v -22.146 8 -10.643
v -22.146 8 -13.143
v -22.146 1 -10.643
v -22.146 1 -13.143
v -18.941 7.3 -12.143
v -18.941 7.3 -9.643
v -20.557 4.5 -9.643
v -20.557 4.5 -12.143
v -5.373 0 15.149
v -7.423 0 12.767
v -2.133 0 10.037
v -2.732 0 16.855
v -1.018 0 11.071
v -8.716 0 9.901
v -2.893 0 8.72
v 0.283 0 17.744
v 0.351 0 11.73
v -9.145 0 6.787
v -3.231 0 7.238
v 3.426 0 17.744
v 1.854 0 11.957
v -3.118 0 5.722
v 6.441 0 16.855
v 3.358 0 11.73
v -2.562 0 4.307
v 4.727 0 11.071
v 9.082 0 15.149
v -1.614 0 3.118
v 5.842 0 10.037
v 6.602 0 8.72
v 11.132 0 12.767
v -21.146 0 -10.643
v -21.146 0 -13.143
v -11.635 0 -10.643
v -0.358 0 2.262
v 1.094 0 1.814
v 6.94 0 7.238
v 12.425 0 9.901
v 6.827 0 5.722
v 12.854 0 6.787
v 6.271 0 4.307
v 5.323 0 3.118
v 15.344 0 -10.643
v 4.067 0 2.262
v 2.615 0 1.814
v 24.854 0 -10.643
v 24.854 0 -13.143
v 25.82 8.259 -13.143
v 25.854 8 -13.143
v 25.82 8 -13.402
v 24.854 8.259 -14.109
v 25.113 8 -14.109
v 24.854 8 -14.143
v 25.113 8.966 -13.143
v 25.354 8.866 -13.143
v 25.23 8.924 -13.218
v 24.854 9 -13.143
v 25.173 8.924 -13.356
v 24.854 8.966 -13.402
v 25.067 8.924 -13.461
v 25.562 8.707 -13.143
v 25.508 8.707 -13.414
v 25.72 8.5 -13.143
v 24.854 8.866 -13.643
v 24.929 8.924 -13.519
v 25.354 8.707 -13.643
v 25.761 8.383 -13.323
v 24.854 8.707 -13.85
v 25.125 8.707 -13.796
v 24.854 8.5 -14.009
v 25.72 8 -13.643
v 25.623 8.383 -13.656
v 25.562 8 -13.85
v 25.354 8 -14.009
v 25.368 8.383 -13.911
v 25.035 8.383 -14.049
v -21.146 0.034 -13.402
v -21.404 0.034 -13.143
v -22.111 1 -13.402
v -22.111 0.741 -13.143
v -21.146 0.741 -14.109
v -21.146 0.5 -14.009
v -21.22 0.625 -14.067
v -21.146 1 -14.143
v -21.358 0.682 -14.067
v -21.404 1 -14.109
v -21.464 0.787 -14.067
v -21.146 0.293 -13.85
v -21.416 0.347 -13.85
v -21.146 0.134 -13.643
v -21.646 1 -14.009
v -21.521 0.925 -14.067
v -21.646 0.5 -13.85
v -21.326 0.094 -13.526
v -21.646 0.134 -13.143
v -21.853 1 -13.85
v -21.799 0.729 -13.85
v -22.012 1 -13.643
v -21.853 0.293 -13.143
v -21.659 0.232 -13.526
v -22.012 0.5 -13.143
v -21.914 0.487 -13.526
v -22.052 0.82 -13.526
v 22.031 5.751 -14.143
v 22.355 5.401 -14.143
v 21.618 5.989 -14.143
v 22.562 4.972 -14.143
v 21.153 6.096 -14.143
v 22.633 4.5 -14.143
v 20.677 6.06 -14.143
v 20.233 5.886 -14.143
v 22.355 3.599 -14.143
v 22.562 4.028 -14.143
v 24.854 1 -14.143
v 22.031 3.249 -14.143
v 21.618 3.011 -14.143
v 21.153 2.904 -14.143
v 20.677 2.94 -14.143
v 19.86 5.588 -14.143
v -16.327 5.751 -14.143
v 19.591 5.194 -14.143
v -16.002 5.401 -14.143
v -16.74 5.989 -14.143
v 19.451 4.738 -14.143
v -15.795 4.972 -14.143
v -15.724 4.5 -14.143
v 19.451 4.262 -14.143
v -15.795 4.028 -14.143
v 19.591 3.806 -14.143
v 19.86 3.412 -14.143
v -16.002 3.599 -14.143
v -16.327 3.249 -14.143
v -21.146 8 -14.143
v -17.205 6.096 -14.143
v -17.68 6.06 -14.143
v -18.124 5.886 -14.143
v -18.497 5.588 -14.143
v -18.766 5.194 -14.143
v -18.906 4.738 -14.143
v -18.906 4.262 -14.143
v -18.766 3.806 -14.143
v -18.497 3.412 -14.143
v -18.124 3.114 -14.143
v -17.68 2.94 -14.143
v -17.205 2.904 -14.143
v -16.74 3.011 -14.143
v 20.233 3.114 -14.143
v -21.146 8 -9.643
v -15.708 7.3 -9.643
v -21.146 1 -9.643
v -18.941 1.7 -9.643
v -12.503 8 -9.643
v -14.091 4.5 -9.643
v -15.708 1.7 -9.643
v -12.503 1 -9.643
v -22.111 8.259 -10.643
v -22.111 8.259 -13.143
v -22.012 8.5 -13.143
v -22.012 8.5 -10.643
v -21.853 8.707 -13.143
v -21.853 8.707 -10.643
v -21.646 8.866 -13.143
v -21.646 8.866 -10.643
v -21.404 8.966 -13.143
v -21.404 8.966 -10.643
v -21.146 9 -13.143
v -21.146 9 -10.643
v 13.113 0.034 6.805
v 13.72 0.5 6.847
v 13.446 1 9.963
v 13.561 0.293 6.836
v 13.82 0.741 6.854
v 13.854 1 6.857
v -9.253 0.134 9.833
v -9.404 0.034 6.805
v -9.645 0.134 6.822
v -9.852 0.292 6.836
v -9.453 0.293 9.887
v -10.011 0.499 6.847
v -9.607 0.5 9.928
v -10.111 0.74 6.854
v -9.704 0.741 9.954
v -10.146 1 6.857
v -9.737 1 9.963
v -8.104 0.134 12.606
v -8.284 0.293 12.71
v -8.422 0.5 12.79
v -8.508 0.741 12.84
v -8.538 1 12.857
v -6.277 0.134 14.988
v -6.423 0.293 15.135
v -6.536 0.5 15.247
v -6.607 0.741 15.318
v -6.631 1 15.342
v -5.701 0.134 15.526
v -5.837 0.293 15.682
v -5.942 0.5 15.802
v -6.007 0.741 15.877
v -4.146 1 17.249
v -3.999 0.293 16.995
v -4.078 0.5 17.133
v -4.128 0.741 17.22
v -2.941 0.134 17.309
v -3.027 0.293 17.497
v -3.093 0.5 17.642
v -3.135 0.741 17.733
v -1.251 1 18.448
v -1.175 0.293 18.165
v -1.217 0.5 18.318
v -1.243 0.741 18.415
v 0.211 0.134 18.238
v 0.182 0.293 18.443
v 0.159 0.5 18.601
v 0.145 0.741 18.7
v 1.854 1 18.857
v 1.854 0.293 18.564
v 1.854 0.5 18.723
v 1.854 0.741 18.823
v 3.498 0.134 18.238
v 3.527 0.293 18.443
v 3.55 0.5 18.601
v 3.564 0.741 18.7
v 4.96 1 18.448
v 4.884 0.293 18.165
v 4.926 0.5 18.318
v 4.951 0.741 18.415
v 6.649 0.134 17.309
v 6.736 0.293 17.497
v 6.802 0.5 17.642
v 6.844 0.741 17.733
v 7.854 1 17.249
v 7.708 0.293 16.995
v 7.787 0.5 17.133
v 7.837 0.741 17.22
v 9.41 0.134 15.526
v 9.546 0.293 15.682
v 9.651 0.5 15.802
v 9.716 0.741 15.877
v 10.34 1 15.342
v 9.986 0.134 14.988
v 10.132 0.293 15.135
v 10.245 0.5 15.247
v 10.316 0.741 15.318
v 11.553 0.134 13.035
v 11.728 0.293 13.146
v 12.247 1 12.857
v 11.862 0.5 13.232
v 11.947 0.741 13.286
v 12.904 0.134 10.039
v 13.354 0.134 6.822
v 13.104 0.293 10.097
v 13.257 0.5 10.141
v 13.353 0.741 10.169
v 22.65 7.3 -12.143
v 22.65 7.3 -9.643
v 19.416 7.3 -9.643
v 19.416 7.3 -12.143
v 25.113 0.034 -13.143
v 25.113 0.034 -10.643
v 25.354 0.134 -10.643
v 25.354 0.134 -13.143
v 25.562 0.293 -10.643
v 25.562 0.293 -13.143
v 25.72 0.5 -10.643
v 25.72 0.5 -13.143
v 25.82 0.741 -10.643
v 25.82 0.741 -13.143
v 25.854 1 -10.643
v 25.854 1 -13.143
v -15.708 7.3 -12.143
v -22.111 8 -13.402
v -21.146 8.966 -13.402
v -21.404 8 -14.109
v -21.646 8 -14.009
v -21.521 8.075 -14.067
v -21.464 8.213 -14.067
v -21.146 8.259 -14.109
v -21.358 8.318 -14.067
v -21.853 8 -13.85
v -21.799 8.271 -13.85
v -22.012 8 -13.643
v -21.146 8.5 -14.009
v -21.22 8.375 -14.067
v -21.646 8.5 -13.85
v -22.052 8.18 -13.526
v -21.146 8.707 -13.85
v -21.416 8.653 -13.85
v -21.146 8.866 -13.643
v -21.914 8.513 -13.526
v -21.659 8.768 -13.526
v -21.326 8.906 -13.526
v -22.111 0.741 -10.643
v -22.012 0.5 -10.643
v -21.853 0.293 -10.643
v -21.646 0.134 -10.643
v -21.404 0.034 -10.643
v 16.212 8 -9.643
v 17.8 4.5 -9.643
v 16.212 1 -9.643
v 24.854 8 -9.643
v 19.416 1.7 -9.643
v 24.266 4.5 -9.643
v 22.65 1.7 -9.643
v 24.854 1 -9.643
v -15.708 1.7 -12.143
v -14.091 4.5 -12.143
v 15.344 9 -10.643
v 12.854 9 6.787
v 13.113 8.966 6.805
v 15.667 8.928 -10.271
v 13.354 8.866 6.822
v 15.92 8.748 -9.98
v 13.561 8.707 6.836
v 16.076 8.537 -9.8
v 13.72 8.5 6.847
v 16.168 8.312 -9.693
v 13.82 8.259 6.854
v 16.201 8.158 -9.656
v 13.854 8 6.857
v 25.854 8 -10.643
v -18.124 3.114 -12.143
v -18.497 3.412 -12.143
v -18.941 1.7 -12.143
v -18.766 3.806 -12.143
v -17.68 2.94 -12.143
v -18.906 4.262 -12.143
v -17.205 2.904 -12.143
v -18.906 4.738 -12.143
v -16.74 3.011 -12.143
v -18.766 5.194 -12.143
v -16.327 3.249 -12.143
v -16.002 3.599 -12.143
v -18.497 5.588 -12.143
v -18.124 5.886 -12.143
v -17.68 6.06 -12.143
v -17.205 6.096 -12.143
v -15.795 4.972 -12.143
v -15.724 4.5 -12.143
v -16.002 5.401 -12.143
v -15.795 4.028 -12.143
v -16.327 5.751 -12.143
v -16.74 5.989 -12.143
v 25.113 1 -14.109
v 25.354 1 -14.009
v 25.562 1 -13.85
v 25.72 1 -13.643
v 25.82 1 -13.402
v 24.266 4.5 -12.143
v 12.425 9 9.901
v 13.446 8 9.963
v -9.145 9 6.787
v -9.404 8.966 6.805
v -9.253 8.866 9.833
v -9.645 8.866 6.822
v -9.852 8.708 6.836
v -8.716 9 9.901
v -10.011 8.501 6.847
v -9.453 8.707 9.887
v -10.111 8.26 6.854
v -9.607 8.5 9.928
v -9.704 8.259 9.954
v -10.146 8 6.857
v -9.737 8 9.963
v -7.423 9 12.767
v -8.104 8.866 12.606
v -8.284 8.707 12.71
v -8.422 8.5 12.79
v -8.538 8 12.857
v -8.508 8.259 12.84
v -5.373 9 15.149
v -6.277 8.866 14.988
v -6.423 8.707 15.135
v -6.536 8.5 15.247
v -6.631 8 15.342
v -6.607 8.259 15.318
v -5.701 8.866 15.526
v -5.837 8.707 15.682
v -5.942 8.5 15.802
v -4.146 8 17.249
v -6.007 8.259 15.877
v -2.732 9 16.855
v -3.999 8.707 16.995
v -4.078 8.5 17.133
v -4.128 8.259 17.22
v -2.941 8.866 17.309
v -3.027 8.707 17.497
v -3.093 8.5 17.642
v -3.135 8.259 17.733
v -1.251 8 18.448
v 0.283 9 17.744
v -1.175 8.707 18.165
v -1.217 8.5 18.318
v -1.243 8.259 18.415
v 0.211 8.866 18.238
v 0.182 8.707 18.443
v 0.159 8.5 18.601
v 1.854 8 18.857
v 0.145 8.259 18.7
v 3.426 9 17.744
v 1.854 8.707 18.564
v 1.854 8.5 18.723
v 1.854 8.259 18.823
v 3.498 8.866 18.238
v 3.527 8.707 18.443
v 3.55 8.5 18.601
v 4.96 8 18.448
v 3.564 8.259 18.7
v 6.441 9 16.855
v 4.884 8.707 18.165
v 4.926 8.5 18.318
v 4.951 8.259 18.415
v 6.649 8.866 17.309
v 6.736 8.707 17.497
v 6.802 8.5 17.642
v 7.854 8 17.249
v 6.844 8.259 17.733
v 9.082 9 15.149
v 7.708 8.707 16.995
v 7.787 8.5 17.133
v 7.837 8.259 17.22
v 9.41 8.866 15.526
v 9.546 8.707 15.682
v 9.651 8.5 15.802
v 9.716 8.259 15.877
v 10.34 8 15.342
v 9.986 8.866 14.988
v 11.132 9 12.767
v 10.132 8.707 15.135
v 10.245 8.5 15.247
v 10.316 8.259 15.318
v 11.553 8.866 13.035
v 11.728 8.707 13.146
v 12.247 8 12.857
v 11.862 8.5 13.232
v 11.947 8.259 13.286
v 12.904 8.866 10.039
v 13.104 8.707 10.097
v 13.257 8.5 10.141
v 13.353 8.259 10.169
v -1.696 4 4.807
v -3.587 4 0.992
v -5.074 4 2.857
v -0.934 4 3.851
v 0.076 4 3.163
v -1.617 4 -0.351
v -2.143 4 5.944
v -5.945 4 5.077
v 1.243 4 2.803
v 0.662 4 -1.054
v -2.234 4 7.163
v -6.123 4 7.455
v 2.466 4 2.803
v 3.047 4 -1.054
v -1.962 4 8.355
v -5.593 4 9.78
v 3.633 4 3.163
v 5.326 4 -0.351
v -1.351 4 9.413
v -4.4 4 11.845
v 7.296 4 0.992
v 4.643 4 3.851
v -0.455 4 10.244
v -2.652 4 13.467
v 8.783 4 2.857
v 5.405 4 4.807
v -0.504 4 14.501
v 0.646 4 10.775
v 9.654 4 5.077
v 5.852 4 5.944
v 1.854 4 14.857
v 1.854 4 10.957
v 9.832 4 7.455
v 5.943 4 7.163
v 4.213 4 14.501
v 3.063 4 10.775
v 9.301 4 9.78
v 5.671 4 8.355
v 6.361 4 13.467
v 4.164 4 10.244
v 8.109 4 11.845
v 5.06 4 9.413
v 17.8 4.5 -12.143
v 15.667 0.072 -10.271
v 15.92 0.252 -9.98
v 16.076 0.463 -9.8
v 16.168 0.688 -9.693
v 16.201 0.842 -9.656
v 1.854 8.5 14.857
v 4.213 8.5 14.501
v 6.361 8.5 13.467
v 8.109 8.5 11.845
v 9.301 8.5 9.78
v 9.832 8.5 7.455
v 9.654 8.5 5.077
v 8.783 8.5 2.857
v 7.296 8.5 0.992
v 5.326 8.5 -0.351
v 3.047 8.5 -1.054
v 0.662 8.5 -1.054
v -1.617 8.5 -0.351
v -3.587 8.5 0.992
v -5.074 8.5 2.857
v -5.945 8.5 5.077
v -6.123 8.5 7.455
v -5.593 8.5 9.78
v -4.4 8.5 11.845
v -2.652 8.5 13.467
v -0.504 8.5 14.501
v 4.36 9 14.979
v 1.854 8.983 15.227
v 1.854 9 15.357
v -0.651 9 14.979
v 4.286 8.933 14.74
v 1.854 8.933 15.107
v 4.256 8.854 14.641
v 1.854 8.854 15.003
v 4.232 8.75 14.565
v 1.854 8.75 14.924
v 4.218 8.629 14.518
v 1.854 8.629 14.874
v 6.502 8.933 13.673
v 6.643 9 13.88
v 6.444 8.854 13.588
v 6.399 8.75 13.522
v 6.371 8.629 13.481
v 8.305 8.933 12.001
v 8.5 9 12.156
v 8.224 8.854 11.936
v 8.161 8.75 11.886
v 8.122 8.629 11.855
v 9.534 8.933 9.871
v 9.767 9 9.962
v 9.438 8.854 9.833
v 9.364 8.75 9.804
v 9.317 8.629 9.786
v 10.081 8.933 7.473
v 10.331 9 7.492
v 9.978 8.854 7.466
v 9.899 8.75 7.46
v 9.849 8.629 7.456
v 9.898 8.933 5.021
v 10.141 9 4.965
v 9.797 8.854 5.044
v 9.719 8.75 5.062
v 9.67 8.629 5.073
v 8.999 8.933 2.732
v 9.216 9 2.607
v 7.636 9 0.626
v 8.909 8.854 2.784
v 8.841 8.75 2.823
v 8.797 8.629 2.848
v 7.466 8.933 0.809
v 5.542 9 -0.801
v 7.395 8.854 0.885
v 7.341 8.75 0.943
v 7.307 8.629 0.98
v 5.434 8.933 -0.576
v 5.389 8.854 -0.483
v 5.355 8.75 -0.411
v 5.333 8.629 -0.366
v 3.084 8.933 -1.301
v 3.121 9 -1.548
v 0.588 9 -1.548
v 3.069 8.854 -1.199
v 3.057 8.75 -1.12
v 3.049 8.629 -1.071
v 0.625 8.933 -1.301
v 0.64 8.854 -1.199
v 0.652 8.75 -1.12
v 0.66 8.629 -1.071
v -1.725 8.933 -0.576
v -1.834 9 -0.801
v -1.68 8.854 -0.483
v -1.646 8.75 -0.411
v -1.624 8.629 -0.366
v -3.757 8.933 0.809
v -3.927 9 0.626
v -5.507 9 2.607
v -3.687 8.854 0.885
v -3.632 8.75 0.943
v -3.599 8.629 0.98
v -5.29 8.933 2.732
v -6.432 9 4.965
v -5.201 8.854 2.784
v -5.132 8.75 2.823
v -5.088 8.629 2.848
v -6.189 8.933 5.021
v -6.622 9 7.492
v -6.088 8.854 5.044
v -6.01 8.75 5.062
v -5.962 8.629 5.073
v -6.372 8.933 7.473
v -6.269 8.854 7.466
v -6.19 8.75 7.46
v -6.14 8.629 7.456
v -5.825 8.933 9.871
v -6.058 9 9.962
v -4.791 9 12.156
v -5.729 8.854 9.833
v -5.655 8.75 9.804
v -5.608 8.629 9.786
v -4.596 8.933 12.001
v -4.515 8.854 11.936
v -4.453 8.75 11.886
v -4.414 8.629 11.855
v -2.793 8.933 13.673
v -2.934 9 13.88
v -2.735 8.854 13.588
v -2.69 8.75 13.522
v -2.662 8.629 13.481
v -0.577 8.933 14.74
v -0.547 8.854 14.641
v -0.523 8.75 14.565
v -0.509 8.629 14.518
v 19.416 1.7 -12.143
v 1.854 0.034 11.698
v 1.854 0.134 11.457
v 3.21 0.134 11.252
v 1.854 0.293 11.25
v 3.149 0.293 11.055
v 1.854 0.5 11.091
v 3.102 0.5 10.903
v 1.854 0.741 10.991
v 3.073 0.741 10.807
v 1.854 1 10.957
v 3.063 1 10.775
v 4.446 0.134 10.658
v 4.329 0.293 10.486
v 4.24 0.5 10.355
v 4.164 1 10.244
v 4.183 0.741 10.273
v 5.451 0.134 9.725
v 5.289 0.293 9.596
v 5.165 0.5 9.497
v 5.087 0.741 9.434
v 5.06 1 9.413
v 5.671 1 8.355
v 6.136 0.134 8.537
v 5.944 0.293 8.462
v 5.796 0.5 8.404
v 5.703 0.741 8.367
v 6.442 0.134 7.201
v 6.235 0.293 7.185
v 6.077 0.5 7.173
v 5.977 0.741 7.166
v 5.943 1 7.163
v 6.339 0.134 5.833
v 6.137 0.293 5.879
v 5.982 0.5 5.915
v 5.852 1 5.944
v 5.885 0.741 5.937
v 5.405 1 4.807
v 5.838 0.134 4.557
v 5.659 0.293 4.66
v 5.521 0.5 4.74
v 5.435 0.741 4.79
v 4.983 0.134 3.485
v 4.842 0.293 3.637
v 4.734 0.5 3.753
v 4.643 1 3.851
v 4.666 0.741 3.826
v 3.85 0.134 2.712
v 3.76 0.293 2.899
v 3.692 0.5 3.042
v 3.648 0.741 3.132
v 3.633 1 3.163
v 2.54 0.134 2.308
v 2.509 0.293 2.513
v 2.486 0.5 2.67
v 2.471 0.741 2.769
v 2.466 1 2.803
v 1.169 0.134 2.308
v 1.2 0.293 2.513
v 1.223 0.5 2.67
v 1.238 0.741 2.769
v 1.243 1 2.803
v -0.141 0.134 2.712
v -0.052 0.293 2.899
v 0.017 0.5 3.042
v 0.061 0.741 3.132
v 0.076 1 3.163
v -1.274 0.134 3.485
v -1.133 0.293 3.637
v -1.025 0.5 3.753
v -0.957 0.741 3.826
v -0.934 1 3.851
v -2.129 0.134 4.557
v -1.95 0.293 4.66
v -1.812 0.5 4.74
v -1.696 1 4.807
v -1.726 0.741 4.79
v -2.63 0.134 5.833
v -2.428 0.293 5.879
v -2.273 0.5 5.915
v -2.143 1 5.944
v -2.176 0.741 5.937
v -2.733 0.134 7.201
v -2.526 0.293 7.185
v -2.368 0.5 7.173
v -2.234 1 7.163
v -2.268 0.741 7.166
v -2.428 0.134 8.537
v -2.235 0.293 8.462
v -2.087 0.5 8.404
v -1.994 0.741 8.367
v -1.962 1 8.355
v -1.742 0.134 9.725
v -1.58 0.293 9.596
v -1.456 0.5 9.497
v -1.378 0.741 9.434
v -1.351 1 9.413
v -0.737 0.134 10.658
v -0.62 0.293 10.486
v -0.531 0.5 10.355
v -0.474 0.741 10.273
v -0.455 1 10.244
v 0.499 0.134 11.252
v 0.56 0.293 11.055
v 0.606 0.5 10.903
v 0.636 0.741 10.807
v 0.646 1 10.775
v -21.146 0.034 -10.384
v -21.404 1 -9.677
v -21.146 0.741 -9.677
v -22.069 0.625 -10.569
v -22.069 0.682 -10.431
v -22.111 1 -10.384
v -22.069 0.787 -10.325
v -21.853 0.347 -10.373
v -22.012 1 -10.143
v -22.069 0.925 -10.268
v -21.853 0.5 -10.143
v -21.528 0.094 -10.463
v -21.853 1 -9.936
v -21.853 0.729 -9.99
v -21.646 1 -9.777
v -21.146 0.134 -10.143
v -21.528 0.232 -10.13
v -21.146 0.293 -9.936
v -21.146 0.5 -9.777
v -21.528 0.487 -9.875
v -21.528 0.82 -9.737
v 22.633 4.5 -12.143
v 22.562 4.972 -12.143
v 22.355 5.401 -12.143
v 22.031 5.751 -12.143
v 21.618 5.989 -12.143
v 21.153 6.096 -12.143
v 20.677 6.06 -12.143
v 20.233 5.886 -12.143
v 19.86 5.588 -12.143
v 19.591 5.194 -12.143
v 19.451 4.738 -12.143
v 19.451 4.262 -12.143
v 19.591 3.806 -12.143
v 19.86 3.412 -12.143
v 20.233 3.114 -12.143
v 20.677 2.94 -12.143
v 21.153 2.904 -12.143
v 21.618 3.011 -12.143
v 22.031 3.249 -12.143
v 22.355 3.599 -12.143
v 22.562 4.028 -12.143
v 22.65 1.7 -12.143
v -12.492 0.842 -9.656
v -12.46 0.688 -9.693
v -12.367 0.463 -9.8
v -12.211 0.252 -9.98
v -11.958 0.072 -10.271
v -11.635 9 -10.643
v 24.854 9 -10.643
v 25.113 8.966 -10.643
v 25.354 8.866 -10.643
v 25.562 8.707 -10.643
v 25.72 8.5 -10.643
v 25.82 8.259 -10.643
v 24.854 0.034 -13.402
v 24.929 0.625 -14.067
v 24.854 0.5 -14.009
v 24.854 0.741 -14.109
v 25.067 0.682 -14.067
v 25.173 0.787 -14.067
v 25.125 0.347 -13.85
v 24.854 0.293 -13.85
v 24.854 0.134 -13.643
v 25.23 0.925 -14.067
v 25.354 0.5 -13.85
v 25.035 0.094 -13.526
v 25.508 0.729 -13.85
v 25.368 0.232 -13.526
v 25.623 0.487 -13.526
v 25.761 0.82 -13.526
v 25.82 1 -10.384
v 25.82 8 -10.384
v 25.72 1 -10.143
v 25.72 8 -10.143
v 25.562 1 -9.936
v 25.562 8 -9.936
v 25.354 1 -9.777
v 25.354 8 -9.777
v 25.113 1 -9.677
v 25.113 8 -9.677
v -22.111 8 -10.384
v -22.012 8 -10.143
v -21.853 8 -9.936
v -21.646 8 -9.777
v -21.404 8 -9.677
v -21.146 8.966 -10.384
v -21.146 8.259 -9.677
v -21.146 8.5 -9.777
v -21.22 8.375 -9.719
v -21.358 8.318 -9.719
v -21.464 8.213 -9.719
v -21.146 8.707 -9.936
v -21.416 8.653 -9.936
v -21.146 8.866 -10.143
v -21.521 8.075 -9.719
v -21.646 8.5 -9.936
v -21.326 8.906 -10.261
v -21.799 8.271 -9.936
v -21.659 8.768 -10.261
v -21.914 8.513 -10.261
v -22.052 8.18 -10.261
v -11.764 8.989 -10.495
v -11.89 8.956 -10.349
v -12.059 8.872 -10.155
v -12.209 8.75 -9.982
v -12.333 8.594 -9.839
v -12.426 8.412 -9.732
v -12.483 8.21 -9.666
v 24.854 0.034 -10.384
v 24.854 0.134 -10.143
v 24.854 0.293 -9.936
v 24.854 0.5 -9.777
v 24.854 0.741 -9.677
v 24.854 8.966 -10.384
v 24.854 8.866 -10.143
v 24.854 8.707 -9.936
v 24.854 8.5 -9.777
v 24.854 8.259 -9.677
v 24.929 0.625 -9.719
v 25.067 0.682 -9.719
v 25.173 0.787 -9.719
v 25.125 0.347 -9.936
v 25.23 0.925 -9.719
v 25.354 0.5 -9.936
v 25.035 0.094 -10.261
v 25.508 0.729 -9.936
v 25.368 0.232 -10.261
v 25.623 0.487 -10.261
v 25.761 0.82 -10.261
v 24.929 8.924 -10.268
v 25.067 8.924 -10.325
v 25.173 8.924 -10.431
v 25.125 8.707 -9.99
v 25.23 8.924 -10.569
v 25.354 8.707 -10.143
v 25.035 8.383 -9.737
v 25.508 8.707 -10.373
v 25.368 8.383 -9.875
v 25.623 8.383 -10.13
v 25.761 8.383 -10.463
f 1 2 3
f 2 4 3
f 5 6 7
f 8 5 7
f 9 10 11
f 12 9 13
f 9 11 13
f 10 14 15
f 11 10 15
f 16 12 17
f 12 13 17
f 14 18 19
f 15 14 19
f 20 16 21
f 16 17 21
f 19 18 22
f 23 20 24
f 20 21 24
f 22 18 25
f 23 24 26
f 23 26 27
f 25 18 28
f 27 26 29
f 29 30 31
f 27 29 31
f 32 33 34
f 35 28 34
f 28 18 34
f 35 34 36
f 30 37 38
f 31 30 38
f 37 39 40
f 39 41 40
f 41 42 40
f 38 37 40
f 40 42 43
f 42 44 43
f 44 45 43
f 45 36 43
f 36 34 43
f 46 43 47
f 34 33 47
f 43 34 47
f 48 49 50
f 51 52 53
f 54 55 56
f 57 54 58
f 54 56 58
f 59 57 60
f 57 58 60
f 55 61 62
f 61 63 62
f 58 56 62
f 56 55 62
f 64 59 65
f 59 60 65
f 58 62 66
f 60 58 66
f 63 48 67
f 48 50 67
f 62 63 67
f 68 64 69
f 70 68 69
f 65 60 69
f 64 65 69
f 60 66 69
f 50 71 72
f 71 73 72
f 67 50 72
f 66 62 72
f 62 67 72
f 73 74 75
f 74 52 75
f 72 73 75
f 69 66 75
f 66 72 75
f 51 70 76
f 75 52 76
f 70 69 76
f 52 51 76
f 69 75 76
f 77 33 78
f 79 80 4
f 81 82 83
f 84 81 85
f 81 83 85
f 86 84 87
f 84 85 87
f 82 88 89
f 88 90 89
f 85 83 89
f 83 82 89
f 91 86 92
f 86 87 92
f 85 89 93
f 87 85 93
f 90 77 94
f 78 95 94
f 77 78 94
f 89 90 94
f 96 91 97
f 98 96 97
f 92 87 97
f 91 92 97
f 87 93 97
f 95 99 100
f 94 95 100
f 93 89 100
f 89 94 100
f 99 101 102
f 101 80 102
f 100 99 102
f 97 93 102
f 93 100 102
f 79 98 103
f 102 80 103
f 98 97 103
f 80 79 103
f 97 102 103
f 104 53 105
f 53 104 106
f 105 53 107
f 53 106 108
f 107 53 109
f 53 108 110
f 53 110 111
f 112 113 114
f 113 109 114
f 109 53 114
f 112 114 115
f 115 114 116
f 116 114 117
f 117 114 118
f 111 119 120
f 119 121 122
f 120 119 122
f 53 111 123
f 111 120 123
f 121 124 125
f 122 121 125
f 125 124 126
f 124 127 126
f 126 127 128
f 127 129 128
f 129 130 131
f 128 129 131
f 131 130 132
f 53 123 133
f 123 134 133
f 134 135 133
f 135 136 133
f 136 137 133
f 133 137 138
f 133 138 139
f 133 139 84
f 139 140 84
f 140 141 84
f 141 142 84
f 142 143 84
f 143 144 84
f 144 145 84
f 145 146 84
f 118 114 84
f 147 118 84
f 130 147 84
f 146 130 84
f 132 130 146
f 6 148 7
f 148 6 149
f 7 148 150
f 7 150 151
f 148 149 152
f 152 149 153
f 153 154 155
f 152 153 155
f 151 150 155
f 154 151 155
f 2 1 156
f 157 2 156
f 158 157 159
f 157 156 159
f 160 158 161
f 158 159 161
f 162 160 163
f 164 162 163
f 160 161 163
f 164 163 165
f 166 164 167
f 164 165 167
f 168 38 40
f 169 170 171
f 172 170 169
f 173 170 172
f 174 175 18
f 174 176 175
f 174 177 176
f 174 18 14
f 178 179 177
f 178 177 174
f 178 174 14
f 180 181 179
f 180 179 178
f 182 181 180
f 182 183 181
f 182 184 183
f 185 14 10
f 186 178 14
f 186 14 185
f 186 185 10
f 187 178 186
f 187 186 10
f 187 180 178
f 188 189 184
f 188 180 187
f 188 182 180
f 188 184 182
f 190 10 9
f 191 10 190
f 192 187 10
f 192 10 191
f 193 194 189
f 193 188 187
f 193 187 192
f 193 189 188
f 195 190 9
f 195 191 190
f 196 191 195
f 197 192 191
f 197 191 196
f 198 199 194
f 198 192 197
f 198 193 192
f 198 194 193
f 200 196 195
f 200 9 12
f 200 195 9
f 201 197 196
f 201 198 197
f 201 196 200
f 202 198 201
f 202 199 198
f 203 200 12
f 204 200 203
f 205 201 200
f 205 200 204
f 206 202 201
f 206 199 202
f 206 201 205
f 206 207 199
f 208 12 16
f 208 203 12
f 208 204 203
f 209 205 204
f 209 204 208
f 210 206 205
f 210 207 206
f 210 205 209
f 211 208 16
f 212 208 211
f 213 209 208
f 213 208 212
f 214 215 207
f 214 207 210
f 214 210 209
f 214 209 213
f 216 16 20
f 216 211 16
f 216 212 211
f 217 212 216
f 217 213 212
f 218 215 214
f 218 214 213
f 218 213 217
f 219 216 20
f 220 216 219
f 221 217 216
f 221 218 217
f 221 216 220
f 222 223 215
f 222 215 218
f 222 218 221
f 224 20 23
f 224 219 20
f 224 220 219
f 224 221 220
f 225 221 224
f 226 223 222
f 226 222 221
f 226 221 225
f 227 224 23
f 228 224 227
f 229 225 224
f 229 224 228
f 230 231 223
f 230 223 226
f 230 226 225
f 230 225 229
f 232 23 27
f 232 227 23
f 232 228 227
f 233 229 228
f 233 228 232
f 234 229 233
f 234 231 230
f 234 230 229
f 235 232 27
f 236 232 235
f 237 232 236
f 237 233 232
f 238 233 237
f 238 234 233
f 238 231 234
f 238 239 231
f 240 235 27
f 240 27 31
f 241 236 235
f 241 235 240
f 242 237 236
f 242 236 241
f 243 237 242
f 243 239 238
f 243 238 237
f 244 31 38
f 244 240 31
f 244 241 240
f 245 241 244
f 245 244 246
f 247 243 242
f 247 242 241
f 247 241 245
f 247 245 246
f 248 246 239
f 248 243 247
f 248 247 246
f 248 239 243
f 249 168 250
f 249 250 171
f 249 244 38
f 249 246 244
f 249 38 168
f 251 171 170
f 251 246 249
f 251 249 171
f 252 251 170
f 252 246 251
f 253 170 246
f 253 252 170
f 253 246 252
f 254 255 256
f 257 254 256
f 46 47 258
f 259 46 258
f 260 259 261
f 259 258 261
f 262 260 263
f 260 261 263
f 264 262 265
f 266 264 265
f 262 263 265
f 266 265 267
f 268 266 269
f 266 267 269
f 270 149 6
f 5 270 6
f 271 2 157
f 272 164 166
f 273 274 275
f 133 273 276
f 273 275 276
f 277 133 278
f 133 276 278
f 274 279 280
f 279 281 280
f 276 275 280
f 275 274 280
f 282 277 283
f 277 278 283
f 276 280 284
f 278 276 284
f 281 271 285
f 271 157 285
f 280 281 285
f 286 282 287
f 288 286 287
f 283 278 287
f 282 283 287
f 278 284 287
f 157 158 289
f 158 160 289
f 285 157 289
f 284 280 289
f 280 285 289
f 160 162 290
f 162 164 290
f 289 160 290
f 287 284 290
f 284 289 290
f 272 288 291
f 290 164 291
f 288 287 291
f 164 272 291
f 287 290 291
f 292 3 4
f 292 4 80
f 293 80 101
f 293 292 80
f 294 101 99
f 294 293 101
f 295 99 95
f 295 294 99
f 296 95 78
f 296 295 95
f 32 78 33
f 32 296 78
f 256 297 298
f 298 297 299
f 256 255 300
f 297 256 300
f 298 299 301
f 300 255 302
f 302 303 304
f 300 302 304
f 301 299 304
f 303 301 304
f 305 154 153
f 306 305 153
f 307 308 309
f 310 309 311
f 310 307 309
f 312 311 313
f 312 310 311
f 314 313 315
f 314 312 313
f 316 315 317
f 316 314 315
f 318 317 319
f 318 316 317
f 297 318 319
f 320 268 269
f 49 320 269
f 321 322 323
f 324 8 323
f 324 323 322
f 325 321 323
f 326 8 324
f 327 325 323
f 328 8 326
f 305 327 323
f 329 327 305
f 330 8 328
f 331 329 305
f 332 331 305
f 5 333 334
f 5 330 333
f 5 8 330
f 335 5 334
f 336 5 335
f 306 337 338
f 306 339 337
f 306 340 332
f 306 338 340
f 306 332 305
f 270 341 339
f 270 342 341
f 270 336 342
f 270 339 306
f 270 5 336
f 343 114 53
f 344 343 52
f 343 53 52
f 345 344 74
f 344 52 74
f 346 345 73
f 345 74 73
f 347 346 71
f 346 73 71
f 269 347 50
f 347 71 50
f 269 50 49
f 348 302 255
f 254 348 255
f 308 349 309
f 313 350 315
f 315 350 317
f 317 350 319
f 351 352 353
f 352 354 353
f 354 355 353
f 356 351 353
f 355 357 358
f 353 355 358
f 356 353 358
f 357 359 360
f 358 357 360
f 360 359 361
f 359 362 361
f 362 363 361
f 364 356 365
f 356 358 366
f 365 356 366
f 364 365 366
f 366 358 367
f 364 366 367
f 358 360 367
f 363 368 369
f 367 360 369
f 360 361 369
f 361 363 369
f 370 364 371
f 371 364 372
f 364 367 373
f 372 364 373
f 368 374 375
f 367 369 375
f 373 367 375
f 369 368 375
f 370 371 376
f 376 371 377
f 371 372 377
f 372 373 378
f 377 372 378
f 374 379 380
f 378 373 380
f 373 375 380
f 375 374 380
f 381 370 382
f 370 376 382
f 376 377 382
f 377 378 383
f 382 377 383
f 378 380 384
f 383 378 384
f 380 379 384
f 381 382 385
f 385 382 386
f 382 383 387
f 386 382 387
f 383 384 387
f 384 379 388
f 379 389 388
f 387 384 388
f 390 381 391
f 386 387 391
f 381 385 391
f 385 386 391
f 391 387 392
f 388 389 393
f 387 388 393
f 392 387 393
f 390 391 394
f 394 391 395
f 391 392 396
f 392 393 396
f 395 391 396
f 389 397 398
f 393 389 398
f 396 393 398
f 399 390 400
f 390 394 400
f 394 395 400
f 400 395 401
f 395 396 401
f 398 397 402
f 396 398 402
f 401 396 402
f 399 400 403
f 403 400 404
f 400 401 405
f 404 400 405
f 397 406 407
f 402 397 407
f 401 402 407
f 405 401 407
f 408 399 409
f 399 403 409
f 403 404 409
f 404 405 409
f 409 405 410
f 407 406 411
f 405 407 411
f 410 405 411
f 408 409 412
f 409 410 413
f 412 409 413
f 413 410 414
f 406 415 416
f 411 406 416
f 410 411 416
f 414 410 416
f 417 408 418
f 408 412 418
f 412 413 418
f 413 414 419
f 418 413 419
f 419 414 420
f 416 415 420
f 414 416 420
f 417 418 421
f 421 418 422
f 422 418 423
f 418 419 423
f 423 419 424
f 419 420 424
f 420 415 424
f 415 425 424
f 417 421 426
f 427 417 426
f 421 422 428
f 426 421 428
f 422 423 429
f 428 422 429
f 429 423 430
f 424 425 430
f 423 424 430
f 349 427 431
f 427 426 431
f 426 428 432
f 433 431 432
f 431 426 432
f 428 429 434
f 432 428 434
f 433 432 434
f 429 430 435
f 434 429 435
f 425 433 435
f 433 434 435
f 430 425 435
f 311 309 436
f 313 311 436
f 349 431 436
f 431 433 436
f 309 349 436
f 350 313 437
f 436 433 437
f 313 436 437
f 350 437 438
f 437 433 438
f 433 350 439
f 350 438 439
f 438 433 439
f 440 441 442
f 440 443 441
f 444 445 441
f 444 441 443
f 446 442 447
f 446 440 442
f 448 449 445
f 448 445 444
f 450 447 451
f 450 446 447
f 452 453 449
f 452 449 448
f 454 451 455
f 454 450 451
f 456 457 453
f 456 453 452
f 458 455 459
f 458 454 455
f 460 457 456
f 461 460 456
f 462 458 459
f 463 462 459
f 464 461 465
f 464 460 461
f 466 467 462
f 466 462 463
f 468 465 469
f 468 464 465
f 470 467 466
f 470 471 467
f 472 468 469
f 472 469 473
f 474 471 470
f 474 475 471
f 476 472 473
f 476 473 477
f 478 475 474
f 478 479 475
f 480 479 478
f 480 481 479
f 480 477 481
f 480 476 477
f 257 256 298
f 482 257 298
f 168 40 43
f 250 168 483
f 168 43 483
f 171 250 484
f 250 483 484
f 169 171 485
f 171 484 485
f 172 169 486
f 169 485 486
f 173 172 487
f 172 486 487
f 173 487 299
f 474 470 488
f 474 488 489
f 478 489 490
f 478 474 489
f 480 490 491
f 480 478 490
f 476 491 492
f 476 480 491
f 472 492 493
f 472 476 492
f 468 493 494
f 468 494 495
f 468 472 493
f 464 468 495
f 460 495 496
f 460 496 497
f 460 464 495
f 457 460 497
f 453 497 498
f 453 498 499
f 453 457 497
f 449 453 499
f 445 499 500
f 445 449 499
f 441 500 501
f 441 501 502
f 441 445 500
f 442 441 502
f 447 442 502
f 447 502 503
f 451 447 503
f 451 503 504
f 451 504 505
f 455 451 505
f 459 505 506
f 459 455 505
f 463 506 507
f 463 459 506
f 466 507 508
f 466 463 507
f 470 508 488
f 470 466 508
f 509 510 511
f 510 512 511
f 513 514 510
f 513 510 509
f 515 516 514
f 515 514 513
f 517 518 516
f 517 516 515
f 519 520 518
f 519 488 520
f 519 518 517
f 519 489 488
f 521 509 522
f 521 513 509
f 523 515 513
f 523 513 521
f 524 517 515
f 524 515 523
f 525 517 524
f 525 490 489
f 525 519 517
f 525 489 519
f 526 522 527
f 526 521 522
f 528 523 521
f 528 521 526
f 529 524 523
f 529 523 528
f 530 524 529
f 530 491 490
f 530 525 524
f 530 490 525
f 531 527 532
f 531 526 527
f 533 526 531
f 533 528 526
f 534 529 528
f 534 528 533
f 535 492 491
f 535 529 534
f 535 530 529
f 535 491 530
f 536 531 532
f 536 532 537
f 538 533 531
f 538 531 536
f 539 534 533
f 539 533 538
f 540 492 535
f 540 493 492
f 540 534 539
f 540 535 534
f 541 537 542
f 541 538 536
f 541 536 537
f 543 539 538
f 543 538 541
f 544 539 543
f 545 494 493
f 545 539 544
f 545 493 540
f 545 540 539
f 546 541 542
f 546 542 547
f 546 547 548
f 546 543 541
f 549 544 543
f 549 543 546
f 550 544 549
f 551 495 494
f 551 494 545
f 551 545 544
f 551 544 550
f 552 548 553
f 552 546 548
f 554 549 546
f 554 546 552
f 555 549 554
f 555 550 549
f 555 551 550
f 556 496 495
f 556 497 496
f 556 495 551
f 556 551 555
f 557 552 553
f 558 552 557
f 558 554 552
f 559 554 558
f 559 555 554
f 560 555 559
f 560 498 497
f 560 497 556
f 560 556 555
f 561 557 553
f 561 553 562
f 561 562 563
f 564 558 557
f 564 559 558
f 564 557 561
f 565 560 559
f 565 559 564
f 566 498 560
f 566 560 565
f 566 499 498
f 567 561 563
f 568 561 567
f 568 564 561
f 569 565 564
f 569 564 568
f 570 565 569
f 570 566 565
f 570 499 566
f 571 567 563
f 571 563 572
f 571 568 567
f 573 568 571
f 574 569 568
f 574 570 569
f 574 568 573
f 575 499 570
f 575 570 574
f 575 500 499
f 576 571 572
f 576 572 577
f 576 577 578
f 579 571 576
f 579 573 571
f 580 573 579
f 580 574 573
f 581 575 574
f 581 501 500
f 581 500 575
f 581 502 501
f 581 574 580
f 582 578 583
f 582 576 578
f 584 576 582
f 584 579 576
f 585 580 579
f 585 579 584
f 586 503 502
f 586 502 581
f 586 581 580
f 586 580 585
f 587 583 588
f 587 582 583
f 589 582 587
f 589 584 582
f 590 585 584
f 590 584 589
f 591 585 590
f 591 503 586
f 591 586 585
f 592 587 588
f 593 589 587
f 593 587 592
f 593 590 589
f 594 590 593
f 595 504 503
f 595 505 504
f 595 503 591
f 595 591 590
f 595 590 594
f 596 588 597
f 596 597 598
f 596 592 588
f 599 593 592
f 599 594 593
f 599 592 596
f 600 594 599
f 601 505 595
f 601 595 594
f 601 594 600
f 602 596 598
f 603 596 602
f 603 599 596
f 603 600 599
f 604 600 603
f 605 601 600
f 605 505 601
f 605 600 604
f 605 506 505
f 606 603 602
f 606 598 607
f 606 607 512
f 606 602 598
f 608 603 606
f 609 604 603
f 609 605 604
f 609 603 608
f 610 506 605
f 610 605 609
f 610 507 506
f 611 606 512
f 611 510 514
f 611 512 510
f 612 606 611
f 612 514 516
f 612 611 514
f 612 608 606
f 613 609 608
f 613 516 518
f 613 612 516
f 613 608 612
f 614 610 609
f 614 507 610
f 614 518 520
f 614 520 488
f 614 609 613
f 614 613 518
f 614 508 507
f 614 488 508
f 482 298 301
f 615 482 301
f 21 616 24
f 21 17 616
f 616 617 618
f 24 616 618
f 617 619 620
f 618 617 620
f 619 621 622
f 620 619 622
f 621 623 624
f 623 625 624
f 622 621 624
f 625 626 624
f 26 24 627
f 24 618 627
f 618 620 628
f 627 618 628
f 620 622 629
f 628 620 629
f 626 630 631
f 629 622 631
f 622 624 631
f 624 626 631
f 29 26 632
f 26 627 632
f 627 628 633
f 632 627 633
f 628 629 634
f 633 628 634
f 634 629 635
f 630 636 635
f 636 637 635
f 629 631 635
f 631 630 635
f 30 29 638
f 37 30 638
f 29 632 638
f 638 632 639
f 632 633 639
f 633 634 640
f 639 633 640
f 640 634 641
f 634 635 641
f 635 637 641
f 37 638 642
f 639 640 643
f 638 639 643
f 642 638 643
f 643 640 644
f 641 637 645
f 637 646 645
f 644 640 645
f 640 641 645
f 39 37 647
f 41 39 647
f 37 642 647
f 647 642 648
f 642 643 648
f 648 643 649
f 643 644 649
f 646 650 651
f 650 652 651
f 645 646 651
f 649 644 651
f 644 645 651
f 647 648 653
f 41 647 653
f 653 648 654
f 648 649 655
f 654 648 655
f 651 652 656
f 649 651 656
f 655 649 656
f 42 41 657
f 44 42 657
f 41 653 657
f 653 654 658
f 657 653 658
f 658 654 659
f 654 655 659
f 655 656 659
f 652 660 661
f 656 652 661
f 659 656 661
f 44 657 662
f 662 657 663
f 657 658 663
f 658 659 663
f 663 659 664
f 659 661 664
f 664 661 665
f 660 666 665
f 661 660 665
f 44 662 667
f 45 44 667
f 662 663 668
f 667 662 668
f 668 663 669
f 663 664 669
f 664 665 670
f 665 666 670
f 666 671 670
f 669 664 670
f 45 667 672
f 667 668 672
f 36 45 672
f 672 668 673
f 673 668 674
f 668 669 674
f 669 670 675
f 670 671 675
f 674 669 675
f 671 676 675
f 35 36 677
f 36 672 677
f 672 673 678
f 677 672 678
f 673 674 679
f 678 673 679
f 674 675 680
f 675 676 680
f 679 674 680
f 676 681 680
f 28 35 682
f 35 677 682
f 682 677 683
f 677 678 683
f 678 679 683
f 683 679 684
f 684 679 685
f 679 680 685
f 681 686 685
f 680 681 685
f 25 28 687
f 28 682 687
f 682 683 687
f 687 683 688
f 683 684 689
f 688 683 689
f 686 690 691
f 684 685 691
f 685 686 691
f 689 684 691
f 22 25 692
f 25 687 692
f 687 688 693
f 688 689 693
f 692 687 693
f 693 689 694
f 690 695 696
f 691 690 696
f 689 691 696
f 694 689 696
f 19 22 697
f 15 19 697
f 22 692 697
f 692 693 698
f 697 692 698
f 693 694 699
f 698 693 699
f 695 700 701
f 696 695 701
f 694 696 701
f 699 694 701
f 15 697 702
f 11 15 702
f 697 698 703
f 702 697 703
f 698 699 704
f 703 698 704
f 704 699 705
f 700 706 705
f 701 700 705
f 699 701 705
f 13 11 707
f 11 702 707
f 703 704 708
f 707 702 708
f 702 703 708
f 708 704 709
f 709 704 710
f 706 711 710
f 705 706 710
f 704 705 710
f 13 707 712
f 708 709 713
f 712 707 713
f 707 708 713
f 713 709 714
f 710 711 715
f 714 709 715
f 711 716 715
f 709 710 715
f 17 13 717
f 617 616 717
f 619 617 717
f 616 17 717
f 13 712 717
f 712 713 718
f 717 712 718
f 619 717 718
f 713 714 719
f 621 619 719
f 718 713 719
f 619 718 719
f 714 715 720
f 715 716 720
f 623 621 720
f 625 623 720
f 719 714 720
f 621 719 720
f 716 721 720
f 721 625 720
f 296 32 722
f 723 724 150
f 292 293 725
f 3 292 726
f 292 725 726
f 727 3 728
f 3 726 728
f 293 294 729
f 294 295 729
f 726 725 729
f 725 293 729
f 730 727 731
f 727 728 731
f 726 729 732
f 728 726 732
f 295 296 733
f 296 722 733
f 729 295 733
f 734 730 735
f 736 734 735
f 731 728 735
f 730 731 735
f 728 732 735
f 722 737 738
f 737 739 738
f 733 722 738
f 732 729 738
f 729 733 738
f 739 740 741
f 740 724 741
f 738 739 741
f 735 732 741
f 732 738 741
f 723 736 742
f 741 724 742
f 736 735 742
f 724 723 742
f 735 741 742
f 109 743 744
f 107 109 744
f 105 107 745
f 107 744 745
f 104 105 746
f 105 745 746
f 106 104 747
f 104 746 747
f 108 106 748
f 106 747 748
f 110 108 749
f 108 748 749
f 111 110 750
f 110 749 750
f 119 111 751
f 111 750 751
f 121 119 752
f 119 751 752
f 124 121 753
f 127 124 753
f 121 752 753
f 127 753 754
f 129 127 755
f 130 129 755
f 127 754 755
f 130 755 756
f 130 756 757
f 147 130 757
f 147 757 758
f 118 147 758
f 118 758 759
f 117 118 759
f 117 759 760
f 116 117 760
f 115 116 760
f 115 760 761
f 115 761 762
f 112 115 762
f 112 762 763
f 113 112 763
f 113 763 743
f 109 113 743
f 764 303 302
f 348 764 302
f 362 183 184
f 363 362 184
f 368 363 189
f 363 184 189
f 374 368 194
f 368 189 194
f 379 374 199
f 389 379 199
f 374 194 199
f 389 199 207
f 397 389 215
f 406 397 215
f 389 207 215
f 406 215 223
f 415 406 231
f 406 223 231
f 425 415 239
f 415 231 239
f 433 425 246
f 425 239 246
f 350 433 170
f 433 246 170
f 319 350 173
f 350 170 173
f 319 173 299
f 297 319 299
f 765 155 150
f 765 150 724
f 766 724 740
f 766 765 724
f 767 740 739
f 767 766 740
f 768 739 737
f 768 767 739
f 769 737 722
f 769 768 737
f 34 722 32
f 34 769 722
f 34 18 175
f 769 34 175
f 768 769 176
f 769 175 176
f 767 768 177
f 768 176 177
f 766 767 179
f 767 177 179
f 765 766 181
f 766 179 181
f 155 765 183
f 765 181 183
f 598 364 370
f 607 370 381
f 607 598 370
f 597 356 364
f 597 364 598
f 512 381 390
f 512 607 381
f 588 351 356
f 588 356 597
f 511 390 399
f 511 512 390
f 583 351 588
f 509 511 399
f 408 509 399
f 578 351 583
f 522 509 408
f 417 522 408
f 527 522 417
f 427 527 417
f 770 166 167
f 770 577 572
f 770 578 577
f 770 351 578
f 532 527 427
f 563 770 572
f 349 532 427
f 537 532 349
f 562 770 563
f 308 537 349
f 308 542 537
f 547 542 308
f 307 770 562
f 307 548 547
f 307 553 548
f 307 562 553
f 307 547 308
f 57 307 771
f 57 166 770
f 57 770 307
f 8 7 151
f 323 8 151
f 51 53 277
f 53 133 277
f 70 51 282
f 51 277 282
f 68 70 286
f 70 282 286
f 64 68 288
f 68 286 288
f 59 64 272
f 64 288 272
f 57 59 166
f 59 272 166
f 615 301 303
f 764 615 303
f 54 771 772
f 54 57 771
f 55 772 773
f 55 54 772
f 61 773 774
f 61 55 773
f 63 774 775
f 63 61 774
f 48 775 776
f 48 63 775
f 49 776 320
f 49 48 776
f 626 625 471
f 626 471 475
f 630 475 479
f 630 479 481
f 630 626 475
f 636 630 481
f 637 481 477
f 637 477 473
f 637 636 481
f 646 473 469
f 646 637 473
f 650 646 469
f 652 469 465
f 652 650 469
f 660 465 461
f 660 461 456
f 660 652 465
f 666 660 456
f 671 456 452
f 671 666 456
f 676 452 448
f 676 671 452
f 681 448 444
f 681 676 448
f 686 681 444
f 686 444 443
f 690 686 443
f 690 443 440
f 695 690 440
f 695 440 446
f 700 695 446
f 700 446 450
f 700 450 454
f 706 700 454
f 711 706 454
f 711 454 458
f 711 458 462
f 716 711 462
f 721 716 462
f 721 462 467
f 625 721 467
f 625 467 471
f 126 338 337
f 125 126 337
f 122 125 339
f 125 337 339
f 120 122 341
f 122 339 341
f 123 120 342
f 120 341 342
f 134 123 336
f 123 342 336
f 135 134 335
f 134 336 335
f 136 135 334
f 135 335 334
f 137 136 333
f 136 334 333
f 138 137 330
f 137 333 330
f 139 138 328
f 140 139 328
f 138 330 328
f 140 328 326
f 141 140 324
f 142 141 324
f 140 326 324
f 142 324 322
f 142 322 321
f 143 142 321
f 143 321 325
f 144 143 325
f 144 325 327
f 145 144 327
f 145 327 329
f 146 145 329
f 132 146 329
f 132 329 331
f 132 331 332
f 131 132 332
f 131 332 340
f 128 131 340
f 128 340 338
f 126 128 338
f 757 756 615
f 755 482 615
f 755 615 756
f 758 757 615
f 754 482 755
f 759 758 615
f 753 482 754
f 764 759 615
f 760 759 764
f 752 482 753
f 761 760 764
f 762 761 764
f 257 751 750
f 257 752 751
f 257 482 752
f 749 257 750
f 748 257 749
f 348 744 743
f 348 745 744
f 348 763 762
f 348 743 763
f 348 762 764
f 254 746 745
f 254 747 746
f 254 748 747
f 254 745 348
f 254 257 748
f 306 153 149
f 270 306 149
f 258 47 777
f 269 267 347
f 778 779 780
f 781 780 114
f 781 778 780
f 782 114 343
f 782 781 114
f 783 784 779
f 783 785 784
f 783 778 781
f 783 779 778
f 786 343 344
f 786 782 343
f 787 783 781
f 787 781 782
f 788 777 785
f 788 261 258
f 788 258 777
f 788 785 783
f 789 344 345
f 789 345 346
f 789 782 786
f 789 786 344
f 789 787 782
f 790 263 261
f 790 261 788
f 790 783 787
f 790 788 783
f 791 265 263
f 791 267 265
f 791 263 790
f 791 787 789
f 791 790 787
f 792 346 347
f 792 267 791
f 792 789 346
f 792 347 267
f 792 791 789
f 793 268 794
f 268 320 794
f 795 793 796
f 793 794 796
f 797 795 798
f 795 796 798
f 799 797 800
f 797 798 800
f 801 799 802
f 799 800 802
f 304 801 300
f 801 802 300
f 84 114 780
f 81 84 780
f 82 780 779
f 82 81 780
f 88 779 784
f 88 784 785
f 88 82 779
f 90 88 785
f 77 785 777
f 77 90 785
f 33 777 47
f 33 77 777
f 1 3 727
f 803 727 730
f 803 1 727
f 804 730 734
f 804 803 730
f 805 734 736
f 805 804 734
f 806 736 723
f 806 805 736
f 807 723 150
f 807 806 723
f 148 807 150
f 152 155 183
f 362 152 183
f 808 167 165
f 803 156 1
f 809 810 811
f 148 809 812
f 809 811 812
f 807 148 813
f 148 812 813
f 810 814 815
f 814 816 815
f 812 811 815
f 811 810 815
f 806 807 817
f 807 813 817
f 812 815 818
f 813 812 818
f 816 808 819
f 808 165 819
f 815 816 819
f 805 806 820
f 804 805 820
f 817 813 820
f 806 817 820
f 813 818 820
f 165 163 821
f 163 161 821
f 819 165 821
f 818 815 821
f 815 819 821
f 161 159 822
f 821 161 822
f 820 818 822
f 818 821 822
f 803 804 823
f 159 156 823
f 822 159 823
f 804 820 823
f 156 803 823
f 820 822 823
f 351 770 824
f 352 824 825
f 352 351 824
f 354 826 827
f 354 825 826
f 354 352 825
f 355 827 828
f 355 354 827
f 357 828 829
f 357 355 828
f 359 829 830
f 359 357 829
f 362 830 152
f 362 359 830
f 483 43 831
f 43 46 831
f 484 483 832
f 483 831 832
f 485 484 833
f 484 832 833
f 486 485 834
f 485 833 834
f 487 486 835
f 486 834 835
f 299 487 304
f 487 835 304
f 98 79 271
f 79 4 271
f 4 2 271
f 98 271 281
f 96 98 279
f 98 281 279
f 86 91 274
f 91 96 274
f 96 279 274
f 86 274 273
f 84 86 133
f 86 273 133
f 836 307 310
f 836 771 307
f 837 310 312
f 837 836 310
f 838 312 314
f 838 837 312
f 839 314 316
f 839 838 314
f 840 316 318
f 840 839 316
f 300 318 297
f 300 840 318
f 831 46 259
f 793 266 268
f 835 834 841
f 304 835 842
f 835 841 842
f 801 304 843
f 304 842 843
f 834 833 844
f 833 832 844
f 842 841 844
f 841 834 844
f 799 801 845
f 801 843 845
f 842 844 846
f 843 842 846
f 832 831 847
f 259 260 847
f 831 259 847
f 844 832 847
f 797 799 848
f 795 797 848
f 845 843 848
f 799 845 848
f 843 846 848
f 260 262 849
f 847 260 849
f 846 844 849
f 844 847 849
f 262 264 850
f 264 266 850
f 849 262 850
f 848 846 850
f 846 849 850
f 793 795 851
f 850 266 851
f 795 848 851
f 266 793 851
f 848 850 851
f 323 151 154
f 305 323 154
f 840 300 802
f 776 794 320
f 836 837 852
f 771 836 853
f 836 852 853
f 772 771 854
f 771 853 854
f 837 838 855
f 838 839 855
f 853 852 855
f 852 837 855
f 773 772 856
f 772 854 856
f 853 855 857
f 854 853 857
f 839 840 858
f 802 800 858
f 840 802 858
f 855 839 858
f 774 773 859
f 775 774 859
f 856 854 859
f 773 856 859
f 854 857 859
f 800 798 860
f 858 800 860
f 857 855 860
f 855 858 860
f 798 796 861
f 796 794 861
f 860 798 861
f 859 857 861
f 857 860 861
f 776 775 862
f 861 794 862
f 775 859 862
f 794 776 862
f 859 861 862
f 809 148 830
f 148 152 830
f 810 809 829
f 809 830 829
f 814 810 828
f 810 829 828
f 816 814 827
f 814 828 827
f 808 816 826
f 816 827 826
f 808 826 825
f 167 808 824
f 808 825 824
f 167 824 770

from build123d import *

# Parameters (mm, degrees)
CROQUIS1_R              = 4.1
SALIENTE_EXTRUIR2_DEPTH = 9
CORTAR_EXTRUIR1_START   = -5
CROQUIS2_R              = 8
CROQUIS2_R_2            = 4.1
CORTAR_EXTRUIR1_DEPTH   = 5
CORTAR_EXTRUIR3_DEPTH   = 2.5
CORTAR_EXTRUIR4_DEPTH   = 2.5
CROQUIS5_R              = 1.6
CORTAR_EXTRUIR5_DEPTH   = 2.5
REDONDEO1_R             = 1
REDONDEO2_R             = 0.5


with BuildPart() as part:
    # Croquis1 → Saliente-Extruir2 (new body)
    with BuildSketch(Plane(origin=(0, 0, 0), x_dir=(1, 0, 0), z_dir=(0, 1, 0))):
        with BuildLine():
            Line((-22.145539906, 14.143192488), (-22.145539906, 9.643192488))
            Line((-22.145539906, 9.643192488), (-12.502682763, 9.643192488))
            Line((-12.502682763, 9.643192488), (-10.145539906, -6.856807512))
            ThreePointArc((-10.145539906, -6.856807512), (1.854460094, -18.856807512), (13.854460094, -6.856807512))
            Line((13.854460094, -6.856807512), (16.211602951, 9.643192488))
            Line((16.211602951, 9.643192488), (25.854460094, 9.643192488))
            Line((25.854460094, 9.643192488), (25.854460094, 14.143192488))
            Line((25.854460094, 14.143192488), (-22.145539906, 14.143192488))
        make_face()
        with Locations(Location((1.854460094, -6.856807512, 0), (0, 0, 270))):
            Circle(CROQUIS1_R, mode=Mode.SUBTRACT)
    extrude(amount=SALIENTE_EXTRUIR2_DEPTH)

    # Croquis2 → Cortar-Extruir1 (cut)
    with BuildSketch(Plane(origin=(0, 9, 0), x_dir=(1, 0, 0), z_dir=(0, 1, 0)).offset(CORTAR_EXTRUIR1_START)):
        with Locations(Location((1.854460094, -6.856807512, 0), (0, 0, 270))):
            Circle(CROQUIS2_R)
        with Locations(Location((1.854460094, -6.856807512, 0), (0, 0, 270))):
            Circle(CROQUIS2_R_2, mode=Mode.SUBTRACT)
    extrude(amount=CORTAR_EXTRUIR1_DEPTH, mode=Mode.SUBTRACT)

    # Croquis3 → Cortar-Extruir3 (cut)
    with BuildSketch(Plane.XY.offset(-9.643192488)):
        Polygon((-14.090949827, 4.5), (-15.707530581, 7.3), (-18.940692088, 7.3), (-20.557272842, 4.5), (-18.940692088, 1.7), (-15.707530581, 1.7), align=None)
    extrude(amount=-CORTAR_EXTRUIR3_DEPTH, mode=Mode.SUBTRACT)

    # Croquis4 → Cortar-Extruir4 (cut)
    with BuildSketch(Plane.XY.offset(-9.643192488)):
        Polygon((24.26619303, 4.5), (22.649612276, 7.3), (19.416450769, 7.3), (17.799870015, 4.5), (19.416450769, 1.7), (22.649612276, 1.7), align=None)
    extrude(amount=-CORTAR_EXTRUIR4_DEPTH, mode=Mode.SUBTRACT)

    # Croquis5 → Cortar-Extruir5 (cut)
    with BuildSketch(Plane.XY.offset(-12.143192488)):
        with Locations((21.033031522, 4.5)):
            Circle(CROQUIS5_R)
        with Locations((-17.324111335, 4.5)):
            Circle(CROQUIS5_R)
    extrude(amount=-CORTAR_EXTRUIR5_DEPTH, mode=Mode.SUBTRACT)

    # Redondeo1
    redondeo1_edges = [part.edges().sort_by_distance(p)[0] for p in [
        (1.854460094, 0, 2.756807512),
        (25.854460094, 0, -11.893192488),
        (21.033031522, 0, -9.643192488),
        (15.033031522, 0, -1.393192488),
        (1.854460094, 0, 18.856807512),
        (-11.324111335, 0, -1.393192488),
        (-17.324111335, 0, -9.643192488),
        (-22.145539906, 9, -11.893192488),
        (-22.145539906, 0, -11.893192488),
        (1.854460094, 0, -14.143192488),
        (-17.324111335, 9, -9.643192488),
        (25.854460094, 4.5, -14.143192488),
        (25.854460094, 4.5, -9.643192488),
        (-22.145539906, 4.5, -9.643192488),
        (-22.145539906, 4.5, -14.143192488),
        (-11.324111335, 9, -1.393192488),
        (1.854460094, 9, 18.856807512),
        (15.033031522, 9, -1.393192488),
        (21.033031522, 9, -9.643192488),
        (25.854460094, 9, -11.893192488),
        (1.854460094, 9, -14.143192488),
    ]]
    fillet(redondeo1_edges, radius=REDONDEO1_R)

    # Redondeo2
    redondeo2_edges = [part.edges().sort_by_distance(p)[0] for p in [
        (1.854460094, 9, -1.143192488),
    ]]
    fillet(redondeo2_edges, radius=REDONDEO2_R)


solid = part.part
